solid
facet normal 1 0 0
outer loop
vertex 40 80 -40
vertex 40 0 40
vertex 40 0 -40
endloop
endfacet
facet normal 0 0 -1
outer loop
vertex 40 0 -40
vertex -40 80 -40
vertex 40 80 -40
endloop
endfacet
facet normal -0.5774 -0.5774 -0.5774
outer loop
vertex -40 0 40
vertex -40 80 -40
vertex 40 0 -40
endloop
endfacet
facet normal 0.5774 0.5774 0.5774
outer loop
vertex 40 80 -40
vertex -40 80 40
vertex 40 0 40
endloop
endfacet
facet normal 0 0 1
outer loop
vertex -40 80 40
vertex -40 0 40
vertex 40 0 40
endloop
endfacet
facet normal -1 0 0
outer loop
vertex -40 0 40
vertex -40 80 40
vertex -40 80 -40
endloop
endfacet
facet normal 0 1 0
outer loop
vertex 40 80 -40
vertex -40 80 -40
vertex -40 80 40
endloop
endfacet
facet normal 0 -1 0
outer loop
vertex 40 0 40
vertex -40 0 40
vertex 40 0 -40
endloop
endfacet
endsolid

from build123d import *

# Parameters (mm, degrees)
SKETCH1_W           = 80
SKETCH1_H           = 80
BOSS_EXTRUDE1_DEPTH = 80
CUT_EXTRUDE1_DEPTH  = 80
CUT_EXTRUDE2_DEPTH  = 80


with BuildPart() as part:
    # Sketch1 → Boss-Extrude1 (new body)
    with BuildSketch(Plane(origin=(0, 0, 0), x_dir=(1, 0, 0), z_dir=(0, 1, 0))):
        Rectangle(SKETCH1_W, SKETCH1_H)
    extrude(amount=BOSS_EXTRUDE1_DEPTH)

    # Sketch5 → Cut-Extrude1 (cut)
    with BuildSketch(Plane(origin=(26.666666667, 26.666666667, 26.666666667), x_dir=(0.8164965809277261, -0.40824829046386296, -0.4082482904638629), z_dir=(0.5773502691896256, 0.5773502691896263, 0.5773502691896254))):
        Polygon((-81.649658093, 28.284271247), (16.329931619, -28.284271247), (16.329931619, 84.852813742), align=None)
    extrude(amount=CUT_EXTRUDE1_DEPTH, mode=Mode.SUBTRACT)

    # Sketch6 → Cut-Extrude2 (cut)
    with BuildSketch(Plane(origin=(0, 0, 0), x_dir=(0.8164965809277261, -0.40824829046386296, -0.4082482904638629), z_dir=(0.5773502691896256, 0.5773502691896263, 0.5773502691896254))):
        Polygon((-48.989794856, -28.284271247), (48.989794856, 28.284271247), (-48.989794856, 84.852813742), align=None)
    extrude(amount=-CUT_EXTRUDE2_DEPTH, mode=Mode.SUBTRACT)


solid = part.part
